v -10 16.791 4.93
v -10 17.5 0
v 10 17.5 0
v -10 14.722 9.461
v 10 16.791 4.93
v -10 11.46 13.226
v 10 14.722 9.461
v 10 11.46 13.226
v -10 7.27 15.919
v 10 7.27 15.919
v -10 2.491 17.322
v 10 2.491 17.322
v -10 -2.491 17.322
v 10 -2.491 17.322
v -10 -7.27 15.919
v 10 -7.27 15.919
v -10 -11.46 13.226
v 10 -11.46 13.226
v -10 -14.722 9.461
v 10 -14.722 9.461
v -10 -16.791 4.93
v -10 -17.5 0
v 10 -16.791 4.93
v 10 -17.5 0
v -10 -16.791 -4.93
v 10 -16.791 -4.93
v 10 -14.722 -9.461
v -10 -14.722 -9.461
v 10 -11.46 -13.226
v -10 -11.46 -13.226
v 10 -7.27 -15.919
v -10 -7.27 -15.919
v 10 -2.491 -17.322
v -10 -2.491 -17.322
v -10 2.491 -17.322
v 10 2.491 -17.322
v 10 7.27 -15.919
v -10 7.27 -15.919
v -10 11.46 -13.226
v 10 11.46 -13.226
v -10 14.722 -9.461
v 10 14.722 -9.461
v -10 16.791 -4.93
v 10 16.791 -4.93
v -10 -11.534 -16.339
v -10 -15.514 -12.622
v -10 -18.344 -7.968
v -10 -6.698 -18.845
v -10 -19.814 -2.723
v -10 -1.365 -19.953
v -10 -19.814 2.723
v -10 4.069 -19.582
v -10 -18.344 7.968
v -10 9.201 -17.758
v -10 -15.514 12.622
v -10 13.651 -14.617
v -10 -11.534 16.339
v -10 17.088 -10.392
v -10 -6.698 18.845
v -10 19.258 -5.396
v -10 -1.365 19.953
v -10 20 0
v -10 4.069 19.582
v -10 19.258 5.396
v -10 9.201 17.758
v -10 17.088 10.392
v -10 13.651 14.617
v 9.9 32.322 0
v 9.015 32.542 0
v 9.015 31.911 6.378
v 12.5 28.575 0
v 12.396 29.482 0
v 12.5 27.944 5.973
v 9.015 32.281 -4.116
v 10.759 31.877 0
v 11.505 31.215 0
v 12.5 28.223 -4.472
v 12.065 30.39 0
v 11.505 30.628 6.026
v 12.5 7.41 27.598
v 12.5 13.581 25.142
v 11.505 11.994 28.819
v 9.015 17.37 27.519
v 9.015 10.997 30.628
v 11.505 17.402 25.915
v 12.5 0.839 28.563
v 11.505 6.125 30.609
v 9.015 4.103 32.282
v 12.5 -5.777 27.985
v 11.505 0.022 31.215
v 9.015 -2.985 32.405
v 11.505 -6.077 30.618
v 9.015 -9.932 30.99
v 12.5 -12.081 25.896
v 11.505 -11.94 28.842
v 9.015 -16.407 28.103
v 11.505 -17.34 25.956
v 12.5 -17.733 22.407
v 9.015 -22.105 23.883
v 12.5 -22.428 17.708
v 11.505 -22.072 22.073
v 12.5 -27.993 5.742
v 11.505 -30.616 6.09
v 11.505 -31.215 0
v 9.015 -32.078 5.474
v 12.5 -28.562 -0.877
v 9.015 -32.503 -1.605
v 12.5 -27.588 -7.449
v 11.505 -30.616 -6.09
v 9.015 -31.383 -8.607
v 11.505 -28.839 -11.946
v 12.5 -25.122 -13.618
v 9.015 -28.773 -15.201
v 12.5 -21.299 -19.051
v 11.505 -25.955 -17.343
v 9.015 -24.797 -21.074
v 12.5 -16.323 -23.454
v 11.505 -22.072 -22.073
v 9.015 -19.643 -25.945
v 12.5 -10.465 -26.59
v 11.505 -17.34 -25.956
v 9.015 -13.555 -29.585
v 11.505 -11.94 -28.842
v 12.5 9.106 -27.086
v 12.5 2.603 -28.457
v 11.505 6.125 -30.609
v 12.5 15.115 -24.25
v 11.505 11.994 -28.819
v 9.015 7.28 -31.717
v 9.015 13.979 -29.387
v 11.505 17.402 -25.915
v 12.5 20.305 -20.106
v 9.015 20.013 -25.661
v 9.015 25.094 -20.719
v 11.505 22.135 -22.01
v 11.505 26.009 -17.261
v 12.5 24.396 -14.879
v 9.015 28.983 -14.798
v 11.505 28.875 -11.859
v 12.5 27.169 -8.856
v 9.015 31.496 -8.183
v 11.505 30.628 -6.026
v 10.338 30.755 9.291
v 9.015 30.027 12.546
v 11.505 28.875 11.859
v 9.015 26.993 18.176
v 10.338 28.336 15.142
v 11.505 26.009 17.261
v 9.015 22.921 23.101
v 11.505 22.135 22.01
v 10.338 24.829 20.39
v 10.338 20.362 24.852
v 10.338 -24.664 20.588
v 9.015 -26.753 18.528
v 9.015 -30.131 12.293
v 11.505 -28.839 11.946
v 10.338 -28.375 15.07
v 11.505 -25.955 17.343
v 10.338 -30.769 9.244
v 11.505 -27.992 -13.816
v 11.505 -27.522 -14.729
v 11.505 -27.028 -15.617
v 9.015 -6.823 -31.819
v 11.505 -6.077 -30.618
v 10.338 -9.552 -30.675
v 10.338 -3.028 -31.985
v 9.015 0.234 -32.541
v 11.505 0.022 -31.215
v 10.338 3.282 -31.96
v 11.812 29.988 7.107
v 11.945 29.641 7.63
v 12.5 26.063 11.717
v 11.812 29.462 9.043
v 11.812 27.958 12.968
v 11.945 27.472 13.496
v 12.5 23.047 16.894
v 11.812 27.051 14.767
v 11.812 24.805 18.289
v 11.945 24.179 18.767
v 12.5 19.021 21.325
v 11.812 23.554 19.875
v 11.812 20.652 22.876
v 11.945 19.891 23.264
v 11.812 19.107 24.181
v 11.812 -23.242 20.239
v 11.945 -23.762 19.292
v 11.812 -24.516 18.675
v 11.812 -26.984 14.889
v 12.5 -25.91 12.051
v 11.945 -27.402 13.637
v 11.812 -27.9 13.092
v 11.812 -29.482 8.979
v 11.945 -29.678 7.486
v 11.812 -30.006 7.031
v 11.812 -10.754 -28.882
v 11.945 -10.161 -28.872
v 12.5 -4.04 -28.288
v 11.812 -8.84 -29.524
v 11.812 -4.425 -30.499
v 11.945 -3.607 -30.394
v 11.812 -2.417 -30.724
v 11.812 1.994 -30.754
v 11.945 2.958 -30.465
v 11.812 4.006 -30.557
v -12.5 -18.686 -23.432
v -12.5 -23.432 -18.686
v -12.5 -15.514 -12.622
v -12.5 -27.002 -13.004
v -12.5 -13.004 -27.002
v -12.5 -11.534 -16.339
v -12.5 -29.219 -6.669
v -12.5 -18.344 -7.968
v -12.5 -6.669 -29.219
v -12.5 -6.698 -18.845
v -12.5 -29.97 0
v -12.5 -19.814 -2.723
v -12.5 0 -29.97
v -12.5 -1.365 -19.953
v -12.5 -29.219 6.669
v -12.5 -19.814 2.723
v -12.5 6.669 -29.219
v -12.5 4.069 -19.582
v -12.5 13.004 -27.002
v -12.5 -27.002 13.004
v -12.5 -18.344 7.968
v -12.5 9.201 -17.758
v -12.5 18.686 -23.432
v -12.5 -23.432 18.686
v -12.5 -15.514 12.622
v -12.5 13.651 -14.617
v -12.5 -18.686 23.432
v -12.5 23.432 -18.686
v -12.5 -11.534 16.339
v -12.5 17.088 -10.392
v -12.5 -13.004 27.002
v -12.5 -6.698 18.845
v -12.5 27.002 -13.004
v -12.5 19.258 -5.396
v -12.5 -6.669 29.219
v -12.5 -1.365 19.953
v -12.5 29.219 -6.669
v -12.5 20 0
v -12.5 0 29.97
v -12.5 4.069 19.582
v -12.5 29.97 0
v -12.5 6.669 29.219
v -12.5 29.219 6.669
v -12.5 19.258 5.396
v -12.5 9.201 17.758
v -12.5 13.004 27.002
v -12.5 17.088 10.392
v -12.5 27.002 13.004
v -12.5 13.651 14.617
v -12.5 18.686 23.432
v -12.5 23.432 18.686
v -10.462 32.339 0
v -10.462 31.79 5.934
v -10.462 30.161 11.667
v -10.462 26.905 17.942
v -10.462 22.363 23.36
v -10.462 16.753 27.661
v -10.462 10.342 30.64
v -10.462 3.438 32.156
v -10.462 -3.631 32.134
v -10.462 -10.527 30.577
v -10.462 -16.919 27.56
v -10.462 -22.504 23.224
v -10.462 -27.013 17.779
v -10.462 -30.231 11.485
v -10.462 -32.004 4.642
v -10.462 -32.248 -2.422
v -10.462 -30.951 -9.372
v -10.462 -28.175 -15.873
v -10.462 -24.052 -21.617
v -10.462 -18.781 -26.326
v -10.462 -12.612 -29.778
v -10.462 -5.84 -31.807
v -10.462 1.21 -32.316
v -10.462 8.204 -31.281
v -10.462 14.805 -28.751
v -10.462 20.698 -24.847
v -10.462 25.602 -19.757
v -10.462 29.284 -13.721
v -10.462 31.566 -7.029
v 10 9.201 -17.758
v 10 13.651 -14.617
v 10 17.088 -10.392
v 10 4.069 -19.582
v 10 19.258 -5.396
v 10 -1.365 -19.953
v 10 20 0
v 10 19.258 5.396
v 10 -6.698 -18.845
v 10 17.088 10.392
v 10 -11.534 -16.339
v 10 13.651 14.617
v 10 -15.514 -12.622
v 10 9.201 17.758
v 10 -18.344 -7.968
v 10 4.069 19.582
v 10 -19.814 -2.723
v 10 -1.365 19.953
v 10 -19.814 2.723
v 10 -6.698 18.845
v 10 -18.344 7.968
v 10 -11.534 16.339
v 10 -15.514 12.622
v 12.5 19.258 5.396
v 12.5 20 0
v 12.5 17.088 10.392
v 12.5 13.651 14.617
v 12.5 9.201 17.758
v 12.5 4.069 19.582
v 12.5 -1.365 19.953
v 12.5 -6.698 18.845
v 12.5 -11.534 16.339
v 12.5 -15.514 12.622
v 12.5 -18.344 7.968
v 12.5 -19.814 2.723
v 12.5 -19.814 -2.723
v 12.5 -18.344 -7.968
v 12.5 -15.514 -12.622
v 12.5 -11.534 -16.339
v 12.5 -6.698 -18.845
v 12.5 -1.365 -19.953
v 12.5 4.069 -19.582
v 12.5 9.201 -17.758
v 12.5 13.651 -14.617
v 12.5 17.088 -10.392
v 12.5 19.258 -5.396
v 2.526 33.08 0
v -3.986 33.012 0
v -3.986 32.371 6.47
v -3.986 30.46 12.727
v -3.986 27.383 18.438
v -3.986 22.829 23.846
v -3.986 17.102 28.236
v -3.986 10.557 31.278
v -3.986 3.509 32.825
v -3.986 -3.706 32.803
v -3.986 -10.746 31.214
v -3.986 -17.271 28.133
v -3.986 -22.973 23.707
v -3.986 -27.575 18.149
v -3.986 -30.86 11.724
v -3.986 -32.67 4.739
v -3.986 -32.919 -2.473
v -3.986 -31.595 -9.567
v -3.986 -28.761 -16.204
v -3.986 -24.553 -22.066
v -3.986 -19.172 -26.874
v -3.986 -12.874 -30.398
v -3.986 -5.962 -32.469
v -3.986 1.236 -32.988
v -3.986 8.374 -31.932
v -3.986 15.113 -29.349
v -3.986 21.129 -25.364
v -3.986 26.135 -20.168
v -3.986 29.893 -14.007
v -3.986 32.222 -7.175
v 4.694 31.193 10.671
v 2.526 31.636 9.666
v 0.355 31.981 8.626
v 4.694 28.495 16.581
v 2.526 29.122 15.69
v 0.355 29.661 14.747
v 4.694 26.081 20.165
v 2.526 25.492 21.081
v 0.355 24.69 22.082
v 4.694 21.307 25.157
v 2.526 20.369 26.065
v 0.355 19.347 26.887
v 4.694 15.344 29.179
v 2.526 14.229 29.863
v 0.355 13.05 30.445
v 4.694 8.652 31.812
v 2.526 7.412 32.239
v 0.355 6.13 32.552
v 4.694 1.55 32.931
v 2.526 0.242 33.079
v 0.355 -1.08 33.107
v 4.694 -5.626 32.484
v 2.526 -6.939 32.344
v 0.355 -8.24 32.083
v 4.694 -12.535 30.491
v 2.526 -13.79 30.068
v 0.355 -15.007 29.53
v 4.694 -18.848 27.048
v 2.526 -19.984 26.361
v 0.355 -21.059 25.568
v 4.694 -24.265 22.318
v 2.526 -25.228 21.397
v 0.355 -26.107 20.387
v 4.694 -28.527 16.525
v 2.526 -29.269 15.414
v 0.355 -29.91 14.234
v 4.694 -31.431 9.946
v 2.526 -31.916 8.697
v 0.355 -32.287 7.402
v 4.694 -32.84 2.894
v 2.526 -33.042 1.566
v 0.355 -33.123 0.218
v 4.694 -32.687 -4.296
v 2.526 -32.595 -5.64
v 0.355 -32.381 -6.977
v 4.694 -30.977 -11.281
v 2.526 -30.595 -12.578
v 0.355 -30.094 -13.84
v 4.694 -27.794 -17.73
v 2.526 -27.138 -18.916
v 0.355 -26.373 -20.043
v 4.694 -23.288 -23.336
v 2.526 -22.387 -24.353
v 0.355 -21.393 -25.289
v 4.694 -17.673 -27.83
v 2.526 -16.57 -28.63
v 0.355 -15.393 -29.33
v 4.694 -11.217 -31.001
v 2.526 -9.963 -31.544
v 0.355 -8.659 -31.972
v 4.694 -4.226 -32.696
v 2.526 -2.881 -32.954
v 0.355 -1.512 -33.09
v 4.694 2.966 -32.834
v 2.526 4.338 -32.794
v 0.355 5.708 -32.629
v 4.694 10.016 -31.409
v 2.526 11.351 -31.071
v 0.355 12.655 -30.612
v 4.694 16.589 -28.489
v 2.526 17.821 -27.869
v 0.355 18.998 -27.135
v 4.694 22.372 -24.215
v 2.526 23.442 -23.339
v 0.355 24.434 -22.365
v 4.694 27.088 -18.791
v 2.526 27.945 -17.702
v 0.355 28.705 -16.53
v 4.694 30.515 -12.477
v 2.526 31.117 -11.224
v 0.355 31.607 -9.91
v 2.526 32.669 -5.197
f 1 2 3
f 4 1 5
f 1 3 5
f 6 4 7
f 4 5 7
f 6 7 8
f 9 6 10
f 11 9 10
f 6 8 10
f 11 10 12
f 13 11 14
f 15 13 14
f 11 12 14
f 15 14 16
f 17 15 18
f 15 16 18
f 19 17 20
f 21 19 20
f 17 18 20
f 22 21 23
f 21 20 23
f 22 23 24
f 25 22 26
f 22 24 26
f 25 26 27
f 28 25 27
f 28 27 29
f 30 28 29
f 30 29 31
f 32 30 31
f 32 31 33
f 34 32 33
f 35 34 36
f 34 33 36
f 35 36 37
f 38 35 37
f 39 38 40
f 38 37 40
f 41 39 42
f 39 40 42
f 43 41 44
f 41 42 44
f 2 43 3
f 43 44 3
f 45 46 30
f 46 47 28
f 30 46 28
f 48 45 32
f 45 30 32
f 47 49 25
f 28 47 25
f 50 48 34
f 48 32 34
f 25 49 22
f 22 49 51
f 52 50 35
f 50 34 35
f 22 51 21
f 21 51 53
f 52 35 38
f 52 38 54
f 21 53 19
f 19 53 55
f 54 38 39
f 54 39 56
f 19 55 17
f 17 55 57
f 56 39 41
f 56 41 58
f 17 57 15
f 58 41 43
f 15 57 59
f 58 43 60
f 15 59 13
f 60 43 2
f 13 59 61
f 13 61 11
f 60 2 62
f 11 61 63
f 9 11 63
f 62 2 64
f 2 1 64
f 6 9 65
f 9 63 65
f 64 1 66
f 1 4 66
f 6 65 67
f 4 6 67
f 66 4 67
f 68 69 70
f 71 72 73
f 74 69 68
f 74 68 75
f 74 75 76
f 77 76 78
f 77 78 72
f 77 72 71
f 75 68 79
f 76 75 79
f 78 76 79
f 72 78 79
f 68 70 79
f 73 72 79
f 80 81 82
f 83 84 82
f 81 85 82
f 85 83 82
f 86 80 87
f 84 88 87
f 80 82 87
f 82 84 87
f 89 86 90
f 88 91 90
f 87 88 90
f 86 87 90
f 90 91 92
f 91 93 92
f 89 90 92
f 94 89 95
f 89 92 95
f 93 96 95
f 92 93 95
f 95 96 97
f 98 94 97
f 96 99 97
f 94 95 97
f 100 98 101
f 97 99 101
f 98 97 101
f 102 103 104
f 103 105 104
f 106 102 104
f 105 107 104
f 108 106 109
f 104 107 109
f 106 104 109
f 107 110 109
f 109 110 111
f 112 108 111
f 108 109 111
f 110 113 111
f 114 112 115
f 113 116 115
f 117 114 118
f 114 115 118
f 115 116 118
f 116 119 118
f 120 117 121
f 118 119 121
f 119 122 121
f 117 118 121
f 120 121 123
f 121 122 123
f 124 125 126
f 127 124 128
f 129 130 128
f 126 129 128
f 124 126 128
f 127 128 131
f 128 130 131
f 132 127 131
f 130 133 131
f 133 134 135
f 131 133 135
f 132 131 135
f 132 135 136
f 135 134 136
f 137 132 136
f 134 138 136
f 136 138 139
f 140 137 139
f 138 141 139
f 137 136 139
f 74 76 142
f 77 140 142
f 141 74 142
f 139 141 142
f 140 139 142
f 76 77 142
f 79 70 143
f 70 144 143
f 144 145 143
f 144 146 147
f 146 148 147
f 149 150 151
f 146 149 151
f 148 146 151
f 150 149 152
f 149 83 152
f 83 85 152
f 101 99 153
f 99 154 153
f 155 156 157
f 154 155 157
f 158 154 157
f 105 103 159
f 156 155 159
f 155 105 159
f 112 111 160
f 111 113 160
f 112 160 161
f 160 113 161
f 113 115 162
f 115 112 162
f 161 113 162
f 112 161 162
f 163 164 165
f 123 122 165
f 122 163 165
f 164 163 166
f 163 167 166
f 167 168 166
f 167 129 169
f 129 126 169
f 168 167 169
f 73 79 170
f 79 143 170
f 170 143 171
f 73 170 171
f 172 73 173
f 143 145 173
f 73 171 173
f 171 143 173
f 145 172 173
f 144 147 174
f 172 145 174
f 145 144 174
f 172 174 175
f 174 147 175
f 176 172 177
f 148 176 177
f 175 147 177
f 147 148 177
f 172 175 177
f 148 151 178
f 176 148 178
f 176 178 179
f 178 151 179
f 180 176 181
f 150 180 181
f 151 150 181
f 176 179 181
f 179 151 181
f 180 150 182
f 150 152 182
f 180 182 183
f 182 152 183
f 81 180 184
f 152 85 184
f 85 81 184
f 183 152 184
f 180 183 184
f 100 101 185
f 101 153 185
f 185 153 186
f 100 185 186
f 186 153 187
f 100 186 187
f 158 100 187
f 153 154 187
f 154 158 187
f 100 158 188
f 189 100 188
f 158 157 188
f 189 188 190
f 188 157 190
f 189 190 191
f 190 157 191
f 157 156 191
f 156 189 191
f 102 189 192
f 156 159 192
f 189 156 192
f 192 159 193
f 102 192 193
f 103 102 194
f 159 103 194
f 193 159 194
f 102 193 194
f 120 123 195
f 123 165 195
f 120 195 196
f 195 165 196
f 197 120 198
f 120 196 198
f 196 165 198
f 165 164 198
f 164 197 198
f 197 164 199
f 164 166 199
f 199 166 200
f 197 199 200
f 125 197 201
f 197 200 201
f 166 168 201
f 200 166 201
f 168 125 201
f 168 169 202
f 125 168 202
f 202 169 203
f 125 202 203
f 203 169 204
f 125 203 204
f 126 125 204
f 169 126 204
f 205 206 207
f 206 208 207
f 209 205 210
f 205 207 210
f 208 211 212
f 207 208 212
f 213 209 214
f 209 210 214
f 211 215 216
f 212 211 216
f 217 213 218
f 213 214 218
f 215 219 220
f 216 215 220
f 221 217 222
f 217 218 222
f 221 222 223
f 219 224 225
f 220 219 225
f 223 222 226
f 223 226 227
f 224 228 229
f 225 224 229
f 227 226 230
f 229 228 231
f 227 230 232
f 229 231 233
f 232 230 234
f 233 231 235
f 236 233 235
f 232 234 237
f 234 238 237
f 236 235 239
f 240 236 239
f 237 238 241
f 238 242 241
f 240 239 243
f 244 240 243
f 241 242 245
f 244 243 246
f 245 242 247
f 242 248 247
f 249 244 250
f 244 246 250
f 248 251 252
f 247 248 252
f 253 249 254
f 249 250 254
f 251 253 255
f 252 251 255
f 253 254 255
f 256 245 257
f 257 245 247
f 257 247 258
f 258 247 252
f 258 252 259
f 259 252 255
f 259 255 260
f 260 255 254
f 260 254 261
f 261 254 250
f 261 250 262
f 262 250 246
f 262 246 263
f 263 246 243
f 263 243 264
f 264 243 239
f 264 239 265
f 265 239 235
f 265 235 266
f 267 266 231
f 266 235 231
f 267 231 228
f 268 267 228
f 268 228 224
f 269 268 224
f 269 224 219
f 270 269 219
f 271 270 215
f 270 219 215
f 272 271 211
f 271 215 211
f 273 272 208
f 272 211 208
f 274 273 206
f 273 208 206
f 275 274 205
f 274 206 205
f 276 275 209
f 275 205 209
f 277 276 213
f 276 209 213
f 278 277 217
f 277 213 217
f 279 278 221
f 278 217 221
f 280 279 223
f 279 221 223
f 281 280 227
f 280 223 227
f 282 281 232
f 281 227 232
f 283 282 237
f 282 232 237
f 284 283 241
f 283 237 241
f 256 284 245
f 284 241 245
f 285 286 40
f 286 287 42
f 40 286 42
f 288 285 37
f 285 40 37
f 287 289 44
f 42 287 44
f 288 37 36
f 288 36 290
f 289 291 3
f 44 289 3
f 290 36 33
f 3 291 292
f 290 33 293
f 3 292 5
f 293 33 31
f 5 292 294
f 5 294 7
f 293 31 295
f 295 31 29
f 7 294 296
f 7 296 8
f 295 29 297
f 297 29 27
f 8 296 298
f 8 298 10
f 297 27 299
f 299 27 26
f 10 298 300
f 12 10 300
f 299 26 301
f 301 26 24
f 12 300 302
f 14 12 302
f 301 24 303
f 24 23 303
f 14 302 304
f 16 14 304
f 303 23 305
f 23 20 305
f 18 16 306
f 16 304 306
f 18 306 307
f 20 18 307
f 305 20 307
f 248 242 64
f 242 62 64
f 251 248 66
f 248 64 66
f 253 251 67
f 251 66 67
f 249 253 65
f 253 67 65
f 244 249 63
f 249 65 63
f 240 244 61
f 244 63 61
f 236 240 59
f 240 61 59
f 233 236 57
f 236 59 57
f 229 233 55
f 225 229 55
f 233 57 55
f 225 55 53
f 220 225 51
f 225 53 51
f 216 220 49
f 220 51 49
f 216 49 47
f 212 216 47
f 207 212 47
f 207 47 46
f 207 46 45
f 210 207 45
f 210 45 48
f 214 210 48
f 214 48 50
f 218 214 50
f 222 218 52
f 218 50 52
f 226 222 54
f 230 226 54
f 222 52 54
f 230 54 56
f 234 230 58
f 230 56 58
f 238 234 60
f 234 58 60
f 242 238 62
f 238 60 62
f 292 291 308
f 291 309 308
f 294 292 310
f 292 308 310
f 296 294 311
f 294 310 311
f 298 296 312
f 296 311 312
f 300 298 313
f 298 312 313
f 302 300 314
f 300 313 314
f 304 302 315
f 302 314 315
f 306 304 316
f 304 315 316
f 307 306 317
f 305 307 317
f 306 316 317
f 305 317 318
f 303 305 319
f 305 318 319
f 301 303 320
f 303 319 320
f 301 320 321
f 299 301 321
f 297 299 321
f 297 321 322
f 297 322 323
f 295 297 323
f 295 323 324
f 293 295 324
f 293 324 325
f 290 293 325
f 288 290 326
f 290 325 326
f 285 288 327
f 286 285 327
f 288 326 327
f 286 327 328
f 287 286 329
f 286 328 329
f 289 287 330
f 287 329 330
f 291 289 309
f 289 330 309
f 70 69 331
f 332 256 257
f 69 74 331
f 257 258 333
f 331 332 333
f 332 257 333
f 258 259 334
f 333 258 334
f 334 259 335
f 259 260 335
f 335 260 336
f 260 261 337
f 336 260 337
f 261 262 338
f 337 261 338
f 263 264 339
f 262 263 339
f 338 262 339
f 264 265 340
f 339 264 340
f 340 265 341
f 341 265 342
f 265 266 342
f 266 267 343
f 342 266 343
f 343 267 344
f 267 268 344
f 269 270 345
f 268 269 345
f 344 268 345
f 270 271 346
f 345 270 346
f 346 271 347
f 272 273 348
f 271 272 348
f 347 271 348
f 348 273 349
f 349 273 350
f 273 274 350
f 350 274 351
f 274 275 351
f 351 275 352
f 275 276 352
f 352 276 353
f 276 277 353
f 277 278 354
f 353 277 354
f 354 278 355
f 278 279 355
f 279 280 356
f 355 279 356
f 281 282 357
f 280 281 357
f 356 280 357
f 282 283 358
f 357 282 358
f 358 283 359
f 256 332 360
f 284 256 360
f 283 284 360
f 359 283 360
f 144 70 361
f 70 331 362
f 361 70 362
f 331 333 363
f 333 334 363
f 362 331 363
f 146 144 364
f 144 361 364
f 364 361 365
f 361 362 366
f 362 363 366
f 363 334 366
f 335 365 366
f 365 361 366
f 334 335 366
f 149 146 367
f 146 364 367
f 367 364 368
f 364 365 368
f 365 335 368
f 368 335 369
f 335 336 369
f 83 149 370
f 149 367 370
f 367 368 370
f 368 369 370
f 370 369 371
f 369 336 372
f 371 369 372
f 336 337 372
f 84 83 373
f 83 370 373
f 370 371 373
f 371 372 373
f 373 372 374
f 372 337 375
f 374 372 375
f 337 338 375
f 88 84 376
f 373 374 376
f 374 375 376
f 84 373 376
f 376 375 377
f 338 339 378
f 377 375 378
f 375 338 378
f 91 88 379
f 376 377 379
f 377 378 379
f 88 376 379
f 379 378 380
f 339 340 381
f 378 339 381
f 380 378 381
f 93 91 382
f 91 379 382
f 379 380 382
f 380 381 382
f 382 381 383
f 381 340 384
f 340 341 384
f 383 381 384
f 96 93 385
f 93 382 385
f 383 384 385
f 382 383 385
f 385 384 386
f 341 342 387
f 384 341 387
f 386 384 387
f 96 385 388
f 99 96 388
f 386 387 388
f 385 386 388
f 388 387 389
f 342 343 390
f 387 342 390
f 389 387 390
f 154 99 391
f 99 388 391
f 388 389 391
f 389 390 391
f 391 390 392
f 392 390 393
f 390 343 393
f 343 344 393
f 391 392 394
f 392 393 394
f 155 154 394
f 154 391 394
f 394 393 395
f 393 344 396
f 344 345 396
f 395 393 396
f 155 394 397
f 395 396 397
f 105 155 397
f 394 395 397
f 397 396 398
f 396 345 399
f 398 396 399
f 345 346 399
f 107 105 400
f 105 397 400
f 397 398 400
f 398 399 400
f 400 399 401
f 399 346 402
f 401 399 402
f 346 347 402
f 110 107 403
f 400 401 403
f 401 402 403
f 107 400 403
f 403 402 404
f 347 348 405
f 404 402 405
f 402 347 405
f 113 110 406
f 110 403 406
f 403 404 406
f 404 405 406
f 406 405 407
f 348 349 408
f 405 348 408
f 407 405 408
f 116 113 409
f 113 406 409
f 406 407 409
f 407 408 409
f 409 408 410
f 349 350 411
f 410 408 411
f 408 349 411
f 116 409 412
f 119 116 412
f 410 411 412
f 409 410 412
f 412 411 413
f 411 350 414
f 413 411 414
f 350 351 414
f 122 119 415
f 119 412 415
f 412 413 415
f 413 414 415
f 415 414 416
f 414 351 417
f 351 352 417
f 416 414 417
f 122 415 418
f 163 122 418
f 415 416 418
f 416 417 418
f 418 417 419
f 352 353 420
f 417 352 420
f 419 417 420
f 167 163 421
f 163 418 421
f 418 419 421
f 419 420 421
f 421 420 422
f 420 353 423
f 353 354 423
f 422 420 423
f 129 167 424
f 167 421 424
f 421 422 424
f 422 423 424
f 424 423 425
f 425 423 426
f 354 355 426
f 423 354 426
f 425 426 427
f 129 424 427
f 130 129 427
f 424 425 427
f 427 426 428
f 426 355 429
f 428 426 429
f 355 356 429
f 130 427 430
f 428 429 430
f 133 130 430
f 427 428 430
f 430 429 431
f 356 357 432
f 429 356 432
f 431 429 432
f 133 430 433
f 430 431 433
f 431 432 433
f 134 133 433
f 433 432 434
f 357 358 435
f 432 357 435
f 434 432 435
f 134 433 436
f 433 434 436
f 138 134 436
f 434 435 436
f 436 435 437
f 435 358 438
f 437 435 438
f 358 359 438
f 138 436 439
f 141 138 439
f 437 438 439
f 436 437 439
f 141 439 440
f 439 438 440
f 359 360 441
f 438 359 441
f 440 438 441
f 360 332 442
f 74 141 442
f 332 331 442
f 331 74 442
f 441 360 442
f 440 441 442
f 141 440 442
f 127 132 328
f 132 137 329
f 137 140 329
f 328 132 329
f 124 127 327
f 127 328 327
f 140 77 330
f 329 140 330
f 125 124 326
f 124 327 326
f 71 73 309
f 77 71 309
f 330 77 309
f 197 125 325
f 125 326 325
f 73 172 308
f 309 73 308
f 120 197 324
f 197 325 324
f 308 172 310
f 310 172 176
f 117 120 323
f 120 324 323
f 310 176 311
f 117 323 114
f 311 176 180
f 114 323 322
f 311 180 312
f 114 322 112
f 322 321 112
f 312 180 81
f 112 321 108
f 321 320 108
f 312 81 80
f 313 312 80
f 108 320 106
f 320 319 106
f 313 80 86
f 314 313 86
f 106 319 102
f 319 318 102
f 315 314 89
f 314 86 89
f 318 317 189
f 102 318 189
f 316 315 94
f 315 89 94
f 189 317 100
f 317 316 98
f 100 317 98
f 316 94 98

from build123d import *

# Parameters (mm, degrees)
F2_R     = 17.5
F3_DEPTH = 20
F4_R     = 4


# Not quite as in the source:
# - a fillet or chamfer that OpenCascade refuses, or shapes differently, is made with other operations: its cross-section is extruded or revolved along the edge and cut away or added


with BuildPart() as f1:
    # F0 (on Top) → F1 (revolve)
    with BuildSketch(Plane.XY):
        with BuildLine():
            Line((-10, 20), (-10, 0))
            Line((-10, 0), (10, 0))
            Line((10, 0), (10, 20))
            Line((10, 20), (12.5, 20))
            Line((12.5, 20), (12.5, 32))
            ThreePointArc((12.5, 32), (0, 33.1251134302), (-12.5, 32))
            Line((-12.5, 32), (-12.5, 20))
            Line((-12.5, 20), (-10, 20))
        make_face()
    revolve(axis=Axis((0, 0, 0), (1, 0, 0)))

    # F2 (on face) → F3 (cut, through all)
    with BuildSketch(Plane.YZ.offset(10)):
        Circle(F2_R)
    extrude(amount=-F3_DEPTH, mode=Mode.SUBTRACT)

    # F4
    f4_edges = [f1.edges().sort_by_distance(p)[0] for p in [
        (12.5, -32, 0),
    ]]
    fillet(f4_edges, radius=F4_R)

    # F5: chamfer of 2 on 1 edges, made by hand

    # F5_s1 → F5_t2 (revolve, cut)
    with BuildSketch(Plane.XY):
        with BuildLine():
            Line((-10.4102425429, 32.3994742196), (-12.5521700899, 29.9094378777))
            Line((-12.5521700899, 29.9094378777), (-12.5921700899, 29.9094378777))
            ThreePointArc((-12.5921700899, 29.9094378777), (-12.54, 30.9547189388), (-12.54, 32))
            Line((-12.54, 32), (-12.5071428571, 32.039357078))
            ThreePointArc((-12.5071428571, 32.039357078), (-11.4587168856, 32.2214187391), (-10.4162210644, 32.4390249122))
            Line((-10.4162210644, 32.4390249122), (-10.4102425429, 32.3994742196))
        make_face()
    revolve(axis=Axis((-12.5, 0, 0), (1, 0, 0)), mode=Mode.SUBTRACT)


solid = f1.part
